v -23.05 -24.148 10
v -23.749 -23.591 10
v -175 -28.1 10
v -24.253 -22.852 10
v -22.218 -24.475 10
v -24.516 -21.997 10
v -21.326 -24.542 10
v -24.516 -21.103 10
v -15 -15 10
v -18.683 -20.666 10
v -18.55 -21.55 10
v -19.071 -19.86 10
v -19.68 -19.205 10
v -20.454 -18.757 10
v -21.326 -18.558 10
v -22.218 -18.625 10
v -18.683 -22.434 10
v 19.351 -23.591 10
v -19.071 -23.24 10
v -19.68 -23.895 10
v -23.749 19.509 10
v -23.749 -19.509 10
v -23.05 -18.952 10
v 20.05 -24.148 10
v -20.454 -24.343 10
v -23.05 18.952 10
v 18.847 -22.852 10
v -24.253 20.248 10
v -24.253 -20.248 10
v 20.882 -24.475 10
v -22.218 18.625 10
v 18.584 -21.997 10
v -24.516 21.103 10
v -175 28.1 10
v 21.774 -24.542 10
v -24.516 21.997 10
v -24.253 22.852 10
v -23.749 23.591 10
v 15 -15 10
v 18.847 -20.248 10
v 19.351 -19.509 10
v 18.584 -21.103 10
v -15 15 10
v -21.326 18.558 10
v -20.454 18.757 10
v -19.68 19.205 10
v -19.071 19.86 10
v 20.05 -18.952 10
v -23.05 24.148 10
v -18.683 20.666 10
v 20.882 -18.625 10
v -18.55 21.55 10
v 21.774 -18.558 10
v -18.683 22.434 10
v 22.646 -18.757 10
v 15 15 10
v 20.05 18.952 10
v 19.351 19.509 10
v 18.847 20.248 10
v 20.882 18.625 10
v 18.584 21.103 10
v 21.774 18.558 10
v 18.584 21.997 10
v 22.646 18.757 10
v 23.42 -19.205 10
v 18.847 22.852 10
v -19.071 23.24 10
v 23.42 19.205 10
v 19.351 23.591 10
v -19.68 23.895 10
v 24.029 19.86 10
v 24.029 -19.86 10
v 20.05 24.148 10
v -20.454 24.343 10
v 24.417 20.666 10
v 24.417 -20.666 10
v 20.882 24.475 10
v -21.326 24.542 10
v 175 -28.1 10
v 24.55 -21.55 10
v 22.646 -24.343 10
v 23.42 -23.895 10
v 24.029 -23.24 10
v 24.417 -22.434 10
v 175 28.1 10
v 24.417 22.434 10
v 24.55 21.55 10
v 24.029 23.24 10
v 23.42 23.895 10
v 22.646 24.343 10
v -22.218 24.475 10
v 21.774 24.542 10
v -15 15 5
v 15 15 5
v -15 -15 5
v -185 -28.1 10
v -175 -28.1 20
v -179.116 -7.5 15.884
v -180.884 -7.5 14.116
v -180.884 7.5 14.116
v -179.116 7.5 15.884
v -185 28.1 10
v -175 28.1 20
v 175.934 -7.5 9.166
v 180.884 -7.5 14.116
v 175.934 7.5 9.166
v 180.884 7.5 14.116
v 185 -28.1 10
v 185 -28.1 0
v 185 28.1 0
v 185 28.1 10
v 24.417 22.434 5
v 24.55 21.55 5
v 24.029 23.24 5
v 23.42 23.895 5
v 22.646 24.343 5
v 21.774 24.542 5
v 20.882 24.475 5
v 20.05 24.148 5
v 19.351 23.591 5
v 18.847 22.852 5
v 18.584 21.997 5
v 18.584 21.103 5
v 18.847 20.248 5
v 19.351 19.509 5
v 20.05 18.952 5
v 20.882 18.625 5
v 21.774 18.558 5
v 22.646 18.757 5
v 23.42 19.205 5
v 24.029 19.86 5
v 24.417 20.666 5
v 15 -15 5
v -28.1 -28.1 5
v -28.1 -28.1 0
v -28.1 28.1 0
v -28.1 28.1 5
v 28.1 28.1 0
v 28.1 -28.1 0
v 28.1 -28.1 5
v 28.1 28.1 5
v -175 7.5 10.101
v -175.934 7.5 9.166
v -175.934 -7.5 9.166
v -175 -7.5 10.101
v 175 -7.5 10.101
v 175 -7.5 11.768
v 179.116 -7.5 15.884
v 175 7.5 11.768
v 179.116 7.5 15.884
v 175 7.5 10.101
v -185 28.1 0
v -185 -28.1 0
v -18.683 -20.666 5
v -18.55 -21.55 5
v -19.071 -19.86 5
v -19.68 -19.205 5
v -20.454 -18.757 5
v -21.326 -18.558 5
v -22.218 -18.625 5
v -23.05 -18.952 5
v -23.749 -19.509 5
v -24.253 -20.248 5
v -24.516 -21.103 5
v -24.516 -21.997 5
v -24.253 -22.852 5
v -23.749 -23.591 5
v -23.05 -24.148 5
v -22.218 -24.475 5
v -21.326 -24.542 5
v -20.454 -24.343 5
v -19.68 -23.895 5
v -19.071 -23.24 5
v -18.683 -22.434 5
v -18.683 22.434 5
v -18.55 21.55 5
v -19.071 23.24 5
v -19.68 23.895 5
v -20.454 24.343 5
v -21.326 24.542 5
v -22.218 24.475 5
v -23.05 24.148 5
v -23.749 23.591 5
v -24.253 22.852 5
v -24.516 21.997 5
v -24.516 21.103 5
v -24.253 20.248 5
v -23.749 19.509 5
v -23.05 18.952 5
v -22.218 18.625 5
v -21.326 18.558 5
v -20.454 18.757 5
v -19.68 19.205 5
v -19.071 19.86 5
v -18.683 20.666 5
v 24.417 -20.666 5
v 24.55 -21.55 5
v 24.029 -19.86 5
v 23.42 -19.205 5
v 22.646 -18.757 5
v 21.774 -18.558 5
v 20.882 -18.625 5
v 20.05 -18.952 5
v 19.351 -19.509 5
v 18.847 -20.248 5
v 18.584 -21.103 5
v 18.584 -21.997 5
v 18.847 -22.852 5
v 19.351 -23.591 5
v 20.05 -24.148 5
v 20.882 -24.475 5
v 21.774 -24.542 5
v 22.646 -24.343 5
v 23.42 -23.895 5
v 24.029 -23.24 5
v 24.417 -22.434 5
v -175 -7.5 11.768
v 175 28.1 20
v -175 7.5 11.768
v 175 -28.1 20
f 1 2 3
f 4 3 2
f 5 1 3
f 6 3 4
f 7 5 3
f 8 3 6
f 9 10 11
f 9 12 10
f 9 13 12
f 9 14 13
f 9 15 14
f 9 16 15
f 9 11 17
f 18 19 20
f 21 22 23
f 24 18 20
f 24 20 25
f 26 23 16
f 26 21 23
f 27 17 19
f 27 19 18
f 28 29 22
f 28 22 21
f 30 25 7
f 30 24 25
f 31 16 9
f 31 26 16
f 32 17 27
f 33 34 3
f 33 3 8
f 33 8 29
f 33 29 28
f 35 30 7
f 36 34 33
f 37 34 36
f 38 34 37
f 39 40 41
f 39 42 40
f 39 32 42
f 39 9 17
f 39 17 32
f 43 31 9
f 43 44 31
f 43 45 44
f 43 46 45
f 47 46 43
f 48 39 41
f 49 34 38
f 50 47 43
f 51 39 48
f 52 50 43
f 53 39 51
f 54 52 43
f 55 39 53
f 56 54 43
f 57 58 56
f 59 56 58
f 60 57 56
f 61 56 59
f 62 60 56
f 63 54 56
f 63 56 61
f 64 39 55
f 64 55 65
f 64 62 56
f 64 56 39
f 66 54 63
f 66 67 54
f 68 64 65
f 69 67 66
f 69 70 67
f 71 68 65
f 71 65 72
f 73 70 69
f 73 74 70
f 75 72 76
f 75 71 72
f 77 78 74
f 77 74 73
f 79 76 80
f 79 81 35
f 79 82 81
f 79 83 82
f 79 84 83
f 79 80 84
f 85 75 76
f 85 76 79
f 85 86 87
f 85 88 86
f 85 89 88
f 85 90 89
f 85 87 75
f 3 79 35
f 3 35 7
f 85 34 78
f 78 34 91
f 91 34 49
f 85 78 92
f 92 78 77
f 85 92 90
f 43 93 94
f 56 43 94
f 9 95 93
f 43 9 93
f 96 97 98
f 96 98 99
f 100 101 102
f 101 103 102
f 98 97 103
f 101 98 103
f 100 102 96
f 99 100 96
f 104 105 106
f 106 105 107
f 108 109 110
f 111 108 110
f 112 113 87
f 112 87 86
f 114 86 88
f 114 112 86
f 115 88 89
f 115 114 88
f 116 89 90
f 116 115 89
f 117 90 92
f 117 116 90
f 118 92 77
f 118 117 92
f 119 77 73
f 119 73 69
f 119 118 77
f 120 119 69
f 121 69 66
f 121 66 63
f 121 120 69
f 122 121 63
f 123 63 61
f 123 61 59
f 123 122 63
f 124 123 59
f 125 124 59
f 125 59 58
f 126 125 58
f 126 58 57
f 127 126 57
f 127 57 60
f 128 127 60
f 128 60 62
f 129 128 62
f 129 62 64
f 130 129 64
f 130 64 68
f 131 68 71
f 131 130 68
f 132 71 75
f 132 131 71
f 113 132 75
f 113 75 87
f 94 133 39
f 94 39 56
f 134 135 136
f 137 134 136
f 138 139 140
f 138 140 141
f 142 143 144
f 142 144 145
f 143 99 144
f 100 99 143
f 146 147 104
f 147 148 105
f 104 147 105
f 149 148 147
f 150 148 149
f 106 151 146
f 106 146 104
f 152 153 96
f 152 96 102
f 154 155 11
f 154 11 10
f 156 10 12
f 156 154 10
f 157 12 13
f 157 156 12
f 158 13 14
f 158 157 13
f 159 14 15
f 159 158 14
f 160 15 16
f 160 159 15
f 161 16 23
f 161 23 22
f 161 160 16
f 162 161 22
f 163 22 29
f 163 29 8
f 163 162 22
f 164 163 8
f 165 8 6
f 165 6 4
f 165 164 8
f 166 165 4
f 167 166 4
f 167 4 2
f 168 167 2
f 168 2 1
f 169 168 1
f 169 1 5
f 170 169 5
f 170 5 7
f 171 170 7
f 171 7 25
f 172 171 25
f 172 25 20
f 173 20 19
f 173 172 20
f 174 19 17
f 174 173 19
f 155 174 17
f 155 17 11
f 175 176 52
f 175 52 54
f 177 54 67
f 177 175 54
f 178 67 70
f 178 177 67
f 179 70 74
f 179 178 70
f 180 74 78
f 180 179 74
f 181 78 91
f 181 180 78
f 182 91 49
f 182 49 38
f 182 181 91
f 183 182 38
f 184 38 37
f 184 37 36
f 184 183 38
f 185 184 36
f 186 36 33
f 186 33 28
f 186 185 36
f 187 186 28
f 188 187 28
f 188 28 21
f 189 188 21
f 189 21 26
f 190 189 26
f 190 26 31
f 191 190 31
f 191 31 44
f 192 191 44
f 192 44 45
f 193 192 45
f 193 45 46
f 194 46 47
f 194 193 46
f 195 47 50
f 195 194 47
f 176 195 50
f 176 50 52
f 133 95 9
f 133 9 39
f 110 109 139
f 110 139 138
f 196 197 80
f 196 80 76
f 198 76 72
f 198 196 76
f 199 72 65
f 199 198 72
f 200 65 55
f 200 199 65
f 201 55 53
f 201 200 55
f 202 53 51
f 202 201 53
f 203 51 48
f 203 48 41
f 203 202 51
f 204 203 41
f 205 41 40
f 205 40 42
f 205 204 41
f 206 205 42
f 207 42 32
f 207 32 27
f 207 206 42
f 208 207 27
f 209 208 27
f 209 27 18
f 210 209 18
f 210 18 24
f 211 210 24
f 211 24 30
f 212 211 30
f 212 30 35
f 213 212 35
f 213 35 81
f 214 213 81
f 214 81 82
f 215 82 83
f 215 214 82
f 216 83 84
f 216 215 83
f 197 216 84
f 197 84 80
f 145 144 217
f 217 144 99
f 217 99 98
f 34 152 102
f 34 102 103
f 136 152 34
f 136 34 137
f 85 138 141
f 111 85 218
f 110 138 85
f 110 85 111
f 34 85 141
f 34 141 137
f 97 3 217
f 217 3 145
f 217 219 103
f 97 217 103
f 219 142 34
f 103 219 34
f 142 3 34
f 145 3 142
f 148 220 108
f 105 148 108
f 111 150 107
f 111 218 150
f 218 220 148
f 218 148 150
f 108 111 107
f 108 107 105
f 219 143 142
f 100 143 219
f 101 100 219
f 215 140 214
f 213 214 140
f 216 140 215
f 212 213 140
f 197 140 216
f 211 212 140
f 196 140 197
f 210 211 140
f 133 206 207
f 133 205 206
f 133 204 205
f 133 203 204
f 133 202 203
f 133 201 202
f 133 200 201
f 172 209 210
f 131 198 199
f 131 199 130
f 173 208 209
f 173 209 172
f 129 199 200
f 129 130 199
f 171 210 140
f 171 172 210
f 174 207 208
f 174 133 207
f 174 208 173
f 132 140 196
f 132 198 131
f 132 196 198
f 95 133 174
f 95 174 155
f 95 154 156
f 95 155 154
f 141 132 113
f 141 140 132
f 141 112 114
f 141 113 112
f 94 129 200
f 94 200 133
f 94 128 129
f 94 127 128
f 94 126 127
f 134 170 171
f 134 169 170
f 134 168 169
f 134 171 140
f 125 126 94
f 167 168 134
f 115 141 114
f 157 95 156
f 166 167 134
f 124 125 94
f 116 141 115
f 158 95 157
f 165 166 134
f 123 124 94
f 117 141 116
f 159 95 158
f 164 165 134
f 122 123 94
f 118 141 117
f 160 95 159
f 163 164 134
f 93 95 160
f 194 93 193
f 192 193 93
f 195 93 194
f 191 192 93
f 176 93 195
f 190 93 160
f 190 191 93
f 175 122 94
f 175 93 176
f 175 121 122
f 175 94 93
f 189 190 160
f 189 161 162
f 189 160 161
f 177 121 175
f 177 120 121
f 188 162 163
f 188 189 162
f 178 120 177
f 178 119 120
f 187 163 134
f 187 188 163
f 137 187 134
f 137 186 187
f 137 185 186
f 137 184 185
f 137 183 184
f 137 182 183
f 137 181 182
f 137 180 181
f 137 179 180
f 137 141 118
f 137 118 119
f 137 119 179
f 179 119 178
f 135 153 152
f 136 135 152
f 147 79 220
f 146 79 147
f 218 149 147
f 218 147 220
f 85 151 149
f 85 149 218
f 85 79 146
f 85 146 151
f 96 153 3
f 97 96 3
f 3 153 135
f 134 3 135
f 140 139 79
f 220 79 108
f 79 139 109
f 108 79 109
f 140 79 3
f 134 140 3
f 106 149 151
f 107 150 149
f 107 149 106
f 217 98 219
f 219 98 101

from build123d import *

# Parameters (mm, degrees)
SKETCH1_W           = 350
SKETCH1_H           = 56.2
BOSS_EXTRUDE1_DEPTH = 10
SKETCH2_W           = 56.2
SKETCH2_H           = 56.2
CUT_EXTRUDE1_DEPTH  = 5
SKETCH3_W           = 10
SKETCH3_H           = 56.2
BOSS_EXTRUDE2_DEPTH = 10
SKETCH4_W           = 10
SKETCH4_H           = 56.2
BOSS_EXTRUDE3_DEPTH = 10
CUT_EXTRUDE2_DEPTH  = 56.2
SKETCH6_W           = 10
SKETCH6_H           = 56.2
BOSS_EXTRUDE4_DEPTH = 10
SKETCH7_W           = 10
SKETCH7_H           = 56.2
BOSS_EXTRUDE5_DEPTH = 10
CUT_EXTRUDE3_DEPTH  = 56.2
SKETCH9_W           = 30
SKETCH9_H           = 30
CUT_EXTRUDE4_DEPTH  = 5
SKETCH10_R          = 3
CUT_EXTRUDE5_DEPTH  = 5
SKETCH11_W          = 2.5
SKETCH11_H          = 15
CUT_EXTRUDE6_DEPTH  = 7
SKETCH12_W          = 2.5
SKETCH12_H          = 15
CUT_EXTRUDE8_DEPTH  = 7
SKETCH14_W          = 56.2
SKETCH14_H          = 56.2
SKETCH14_R          = 3
SKETCH14_W_2        = 30
SKETCH14_H_2        = 30
BOSS_EXTRUDE7_DEPTH = 5
SKETCH15_W          = 56.2
SKETCH15_H          = 56.2
CUT_EXTRUDE9_DEPTH  = 5


with BuildPart() as part:
    # Sketch1 → Boss-Extrude1 (new body)
    with BuildSketch(Plane.XY):
        Rectangle(SKETCH1_W, SKETCH1_H)
    extrude(amount=BOSS_EXTRUDE1_DEPTH)

    # Sketch2 → Cut-Extrude1 (cut)
    with BuildSketch(Plane.XY.offset(10)):
        Rectangle(SKETCH2_W, SKETCH2_H)
    extrude(amount=-CUT_EXTRUDE1_DEPTH, mode=Mode.SUBTRACT)

    # Sketch3 → Boss-Extrude2 (add)
    with BuildSketch(Plane(origin=(175, 0, 0), x_dir=(0, 0, -1), z_dir=(1, 0, 0))):
        with Locations((-5, 0)):
            Rectangle(SKETCH3_W, SKETCH3_H)
    extrude(amount=BOSS_EXTRUDE2_DEPTH)

    # Sketch4 → Boss-Extrude3 (add)
    with BuildSketch(Plane.XY.offset(10)):
        with Locations((180, 0)):
            Rectangle(SKETCH4_W, SKETCH4_H)
    extrude(amount=BOSS_EXTRUDE3_DEPTH)

    # Sketch5 → Cut-Extrude2 (cut)
    with BuildSketch(Plane(origin=(0, 28.1, 0), x_dir=(1, 0, 0), z_dir=(0, 1, 0))):
        Polygon((175, -20), (185, -10), (185, -20), align=None)
    extrude(amount=-CUT_EXTRUDE2_DEPTH, mode=Mode.SUBTRACT)

    # Sketch6 → Boss-Extrude4 (add)
    with BuildSketch(Plane.ZY.offset(175)):
        with Locations((5, 0)):
            Rectangle(SKETCH6_W, SKETCH6_H)
    extrude(amount=BOSS_EXTRUDE4_DEPTH)

    # Sketch7 → Boss-Extrude5 (add)
    with BuildSketch(Plane.XY.offset(10)):
        with Locations((-180, 0)):
            Rectangle(SKETCH7_W, SKETCH7_H)
    extrude(amount=BOSS_EXTRUDE5_DEPTH)

    # Sketch8 → Cut-Extrude3 (cut)
    with BuildSketch(Plane(origin=(0, 28.1, 0), x_dir=(1, 0, 0), z_dir=(0, 1, 0))):
        Polygon((-175, -20), (-185, -10), (-185, -20), align=None)
    extrude(amount=-CUT_EXTRUDE3_DEPTH, mode=Mode.SUBTRACT)

    # Sketch9 → Cut-Extrude4 (cut)
    with BuildSketch(Plane.XY.offset(5)):
        Rectangle(SKETCH9_W, SKETCH9_H)
    extrude(amount=-CUT_EXTRUDE4_DEPTH, mode=Mode.SUBTRACT)

    # Sketch10 → Cut-Extrude5 (cut)
    with BuildSketch(Plane.XY.offset(5)):
        with Locations((21.55, 21.55)):
            Circle(SKETCH10_R)
        with Locations((-21.55, -21.55)):
            Circle(SKETCH10_R)
        with Locations((-21.55, 21.55)):
            Circle(SKETCH10_R)
        with Locations((21.55, -21.55)):
            Circle(SKETCH10_R)
    extrude(amount=-CUT_EXTRUDE5_DEPTH, mode=Mode.SUBTRACT)

    # Sketch11 → Cut-Extrude6 (cut)
    with BuildSketch(Plane(origin=(97.5, 0, 97.5), x_dir=(0.707106781, 0, -0.707106781), z_dir=(0.707106781, 0, 0.707106781))):
        with Locations((116.672618896, 0)):
            Rectangle(SKETCH11_W, SKETCH11_H)
    extrude(amount=-CUT_EXTRUDE6_DEPTH, mode=Mode.SUBTRACT)

    # Sketch12 → Cut-Extrude8 (cut)
    with BuildSketch(Plane(origin=(-97.5, 0, 97.5), x_dir=(0.707106781, 0, 0.707106781), z_dir=(-0.707106781, 0, 0.707106781))):
        with Locations((-116.672618896, 0)):
            Rectangle(SKETCH12_W, SKETCH12_H)
    extrude(amount=-CUT_EXTRUDE8_DEPTH, mode=Mode.SUBTRACT)

    # Sketch14 → Boss-Extrude7 (add)
    with BuildSketch(Plane.XY.offset(5)):
        Rectangle(SKETCH14_W, SKETCH14_H)
        with Locations((-21.55, 21.55)):
            Circle(SKETCH14_R, mode=Mode.SUBTRACT)
        with Locations((21.55, 21.55)):
            Circle(SKETCH14_R, mode=Mode.SUBTRACT)
        with Locations((21.55, -21.55)):
            Circle(SKETCH14_R, mode=Mode.SUBTRACT)
        with Locations((-21.55, -21.55)):
            Circle(SKETCH14_R, mode=Mode.SUBTRACT)
        Rectangle(SKETCH14_W_2, SKETCH14_H_2, mode=Mode.SUBTRACT)
    extrude(amount=BOSS_EXTRUDE7_DEPTH)

    # Sketch15 → Cut-Extrude9 (cut)
    with BuildSketch(Plane(origin=(0, 0, 0), x_dir=(-1, 0, 0), z_dir=(0, 0, -1))):
        Rectangle(SKETCH15_W, SKETCH15_H)
    extrude(amount=-CUT_EXTRUDE9_DEPTH, mode=Mode.SUBTRACT)


solid = part.part
